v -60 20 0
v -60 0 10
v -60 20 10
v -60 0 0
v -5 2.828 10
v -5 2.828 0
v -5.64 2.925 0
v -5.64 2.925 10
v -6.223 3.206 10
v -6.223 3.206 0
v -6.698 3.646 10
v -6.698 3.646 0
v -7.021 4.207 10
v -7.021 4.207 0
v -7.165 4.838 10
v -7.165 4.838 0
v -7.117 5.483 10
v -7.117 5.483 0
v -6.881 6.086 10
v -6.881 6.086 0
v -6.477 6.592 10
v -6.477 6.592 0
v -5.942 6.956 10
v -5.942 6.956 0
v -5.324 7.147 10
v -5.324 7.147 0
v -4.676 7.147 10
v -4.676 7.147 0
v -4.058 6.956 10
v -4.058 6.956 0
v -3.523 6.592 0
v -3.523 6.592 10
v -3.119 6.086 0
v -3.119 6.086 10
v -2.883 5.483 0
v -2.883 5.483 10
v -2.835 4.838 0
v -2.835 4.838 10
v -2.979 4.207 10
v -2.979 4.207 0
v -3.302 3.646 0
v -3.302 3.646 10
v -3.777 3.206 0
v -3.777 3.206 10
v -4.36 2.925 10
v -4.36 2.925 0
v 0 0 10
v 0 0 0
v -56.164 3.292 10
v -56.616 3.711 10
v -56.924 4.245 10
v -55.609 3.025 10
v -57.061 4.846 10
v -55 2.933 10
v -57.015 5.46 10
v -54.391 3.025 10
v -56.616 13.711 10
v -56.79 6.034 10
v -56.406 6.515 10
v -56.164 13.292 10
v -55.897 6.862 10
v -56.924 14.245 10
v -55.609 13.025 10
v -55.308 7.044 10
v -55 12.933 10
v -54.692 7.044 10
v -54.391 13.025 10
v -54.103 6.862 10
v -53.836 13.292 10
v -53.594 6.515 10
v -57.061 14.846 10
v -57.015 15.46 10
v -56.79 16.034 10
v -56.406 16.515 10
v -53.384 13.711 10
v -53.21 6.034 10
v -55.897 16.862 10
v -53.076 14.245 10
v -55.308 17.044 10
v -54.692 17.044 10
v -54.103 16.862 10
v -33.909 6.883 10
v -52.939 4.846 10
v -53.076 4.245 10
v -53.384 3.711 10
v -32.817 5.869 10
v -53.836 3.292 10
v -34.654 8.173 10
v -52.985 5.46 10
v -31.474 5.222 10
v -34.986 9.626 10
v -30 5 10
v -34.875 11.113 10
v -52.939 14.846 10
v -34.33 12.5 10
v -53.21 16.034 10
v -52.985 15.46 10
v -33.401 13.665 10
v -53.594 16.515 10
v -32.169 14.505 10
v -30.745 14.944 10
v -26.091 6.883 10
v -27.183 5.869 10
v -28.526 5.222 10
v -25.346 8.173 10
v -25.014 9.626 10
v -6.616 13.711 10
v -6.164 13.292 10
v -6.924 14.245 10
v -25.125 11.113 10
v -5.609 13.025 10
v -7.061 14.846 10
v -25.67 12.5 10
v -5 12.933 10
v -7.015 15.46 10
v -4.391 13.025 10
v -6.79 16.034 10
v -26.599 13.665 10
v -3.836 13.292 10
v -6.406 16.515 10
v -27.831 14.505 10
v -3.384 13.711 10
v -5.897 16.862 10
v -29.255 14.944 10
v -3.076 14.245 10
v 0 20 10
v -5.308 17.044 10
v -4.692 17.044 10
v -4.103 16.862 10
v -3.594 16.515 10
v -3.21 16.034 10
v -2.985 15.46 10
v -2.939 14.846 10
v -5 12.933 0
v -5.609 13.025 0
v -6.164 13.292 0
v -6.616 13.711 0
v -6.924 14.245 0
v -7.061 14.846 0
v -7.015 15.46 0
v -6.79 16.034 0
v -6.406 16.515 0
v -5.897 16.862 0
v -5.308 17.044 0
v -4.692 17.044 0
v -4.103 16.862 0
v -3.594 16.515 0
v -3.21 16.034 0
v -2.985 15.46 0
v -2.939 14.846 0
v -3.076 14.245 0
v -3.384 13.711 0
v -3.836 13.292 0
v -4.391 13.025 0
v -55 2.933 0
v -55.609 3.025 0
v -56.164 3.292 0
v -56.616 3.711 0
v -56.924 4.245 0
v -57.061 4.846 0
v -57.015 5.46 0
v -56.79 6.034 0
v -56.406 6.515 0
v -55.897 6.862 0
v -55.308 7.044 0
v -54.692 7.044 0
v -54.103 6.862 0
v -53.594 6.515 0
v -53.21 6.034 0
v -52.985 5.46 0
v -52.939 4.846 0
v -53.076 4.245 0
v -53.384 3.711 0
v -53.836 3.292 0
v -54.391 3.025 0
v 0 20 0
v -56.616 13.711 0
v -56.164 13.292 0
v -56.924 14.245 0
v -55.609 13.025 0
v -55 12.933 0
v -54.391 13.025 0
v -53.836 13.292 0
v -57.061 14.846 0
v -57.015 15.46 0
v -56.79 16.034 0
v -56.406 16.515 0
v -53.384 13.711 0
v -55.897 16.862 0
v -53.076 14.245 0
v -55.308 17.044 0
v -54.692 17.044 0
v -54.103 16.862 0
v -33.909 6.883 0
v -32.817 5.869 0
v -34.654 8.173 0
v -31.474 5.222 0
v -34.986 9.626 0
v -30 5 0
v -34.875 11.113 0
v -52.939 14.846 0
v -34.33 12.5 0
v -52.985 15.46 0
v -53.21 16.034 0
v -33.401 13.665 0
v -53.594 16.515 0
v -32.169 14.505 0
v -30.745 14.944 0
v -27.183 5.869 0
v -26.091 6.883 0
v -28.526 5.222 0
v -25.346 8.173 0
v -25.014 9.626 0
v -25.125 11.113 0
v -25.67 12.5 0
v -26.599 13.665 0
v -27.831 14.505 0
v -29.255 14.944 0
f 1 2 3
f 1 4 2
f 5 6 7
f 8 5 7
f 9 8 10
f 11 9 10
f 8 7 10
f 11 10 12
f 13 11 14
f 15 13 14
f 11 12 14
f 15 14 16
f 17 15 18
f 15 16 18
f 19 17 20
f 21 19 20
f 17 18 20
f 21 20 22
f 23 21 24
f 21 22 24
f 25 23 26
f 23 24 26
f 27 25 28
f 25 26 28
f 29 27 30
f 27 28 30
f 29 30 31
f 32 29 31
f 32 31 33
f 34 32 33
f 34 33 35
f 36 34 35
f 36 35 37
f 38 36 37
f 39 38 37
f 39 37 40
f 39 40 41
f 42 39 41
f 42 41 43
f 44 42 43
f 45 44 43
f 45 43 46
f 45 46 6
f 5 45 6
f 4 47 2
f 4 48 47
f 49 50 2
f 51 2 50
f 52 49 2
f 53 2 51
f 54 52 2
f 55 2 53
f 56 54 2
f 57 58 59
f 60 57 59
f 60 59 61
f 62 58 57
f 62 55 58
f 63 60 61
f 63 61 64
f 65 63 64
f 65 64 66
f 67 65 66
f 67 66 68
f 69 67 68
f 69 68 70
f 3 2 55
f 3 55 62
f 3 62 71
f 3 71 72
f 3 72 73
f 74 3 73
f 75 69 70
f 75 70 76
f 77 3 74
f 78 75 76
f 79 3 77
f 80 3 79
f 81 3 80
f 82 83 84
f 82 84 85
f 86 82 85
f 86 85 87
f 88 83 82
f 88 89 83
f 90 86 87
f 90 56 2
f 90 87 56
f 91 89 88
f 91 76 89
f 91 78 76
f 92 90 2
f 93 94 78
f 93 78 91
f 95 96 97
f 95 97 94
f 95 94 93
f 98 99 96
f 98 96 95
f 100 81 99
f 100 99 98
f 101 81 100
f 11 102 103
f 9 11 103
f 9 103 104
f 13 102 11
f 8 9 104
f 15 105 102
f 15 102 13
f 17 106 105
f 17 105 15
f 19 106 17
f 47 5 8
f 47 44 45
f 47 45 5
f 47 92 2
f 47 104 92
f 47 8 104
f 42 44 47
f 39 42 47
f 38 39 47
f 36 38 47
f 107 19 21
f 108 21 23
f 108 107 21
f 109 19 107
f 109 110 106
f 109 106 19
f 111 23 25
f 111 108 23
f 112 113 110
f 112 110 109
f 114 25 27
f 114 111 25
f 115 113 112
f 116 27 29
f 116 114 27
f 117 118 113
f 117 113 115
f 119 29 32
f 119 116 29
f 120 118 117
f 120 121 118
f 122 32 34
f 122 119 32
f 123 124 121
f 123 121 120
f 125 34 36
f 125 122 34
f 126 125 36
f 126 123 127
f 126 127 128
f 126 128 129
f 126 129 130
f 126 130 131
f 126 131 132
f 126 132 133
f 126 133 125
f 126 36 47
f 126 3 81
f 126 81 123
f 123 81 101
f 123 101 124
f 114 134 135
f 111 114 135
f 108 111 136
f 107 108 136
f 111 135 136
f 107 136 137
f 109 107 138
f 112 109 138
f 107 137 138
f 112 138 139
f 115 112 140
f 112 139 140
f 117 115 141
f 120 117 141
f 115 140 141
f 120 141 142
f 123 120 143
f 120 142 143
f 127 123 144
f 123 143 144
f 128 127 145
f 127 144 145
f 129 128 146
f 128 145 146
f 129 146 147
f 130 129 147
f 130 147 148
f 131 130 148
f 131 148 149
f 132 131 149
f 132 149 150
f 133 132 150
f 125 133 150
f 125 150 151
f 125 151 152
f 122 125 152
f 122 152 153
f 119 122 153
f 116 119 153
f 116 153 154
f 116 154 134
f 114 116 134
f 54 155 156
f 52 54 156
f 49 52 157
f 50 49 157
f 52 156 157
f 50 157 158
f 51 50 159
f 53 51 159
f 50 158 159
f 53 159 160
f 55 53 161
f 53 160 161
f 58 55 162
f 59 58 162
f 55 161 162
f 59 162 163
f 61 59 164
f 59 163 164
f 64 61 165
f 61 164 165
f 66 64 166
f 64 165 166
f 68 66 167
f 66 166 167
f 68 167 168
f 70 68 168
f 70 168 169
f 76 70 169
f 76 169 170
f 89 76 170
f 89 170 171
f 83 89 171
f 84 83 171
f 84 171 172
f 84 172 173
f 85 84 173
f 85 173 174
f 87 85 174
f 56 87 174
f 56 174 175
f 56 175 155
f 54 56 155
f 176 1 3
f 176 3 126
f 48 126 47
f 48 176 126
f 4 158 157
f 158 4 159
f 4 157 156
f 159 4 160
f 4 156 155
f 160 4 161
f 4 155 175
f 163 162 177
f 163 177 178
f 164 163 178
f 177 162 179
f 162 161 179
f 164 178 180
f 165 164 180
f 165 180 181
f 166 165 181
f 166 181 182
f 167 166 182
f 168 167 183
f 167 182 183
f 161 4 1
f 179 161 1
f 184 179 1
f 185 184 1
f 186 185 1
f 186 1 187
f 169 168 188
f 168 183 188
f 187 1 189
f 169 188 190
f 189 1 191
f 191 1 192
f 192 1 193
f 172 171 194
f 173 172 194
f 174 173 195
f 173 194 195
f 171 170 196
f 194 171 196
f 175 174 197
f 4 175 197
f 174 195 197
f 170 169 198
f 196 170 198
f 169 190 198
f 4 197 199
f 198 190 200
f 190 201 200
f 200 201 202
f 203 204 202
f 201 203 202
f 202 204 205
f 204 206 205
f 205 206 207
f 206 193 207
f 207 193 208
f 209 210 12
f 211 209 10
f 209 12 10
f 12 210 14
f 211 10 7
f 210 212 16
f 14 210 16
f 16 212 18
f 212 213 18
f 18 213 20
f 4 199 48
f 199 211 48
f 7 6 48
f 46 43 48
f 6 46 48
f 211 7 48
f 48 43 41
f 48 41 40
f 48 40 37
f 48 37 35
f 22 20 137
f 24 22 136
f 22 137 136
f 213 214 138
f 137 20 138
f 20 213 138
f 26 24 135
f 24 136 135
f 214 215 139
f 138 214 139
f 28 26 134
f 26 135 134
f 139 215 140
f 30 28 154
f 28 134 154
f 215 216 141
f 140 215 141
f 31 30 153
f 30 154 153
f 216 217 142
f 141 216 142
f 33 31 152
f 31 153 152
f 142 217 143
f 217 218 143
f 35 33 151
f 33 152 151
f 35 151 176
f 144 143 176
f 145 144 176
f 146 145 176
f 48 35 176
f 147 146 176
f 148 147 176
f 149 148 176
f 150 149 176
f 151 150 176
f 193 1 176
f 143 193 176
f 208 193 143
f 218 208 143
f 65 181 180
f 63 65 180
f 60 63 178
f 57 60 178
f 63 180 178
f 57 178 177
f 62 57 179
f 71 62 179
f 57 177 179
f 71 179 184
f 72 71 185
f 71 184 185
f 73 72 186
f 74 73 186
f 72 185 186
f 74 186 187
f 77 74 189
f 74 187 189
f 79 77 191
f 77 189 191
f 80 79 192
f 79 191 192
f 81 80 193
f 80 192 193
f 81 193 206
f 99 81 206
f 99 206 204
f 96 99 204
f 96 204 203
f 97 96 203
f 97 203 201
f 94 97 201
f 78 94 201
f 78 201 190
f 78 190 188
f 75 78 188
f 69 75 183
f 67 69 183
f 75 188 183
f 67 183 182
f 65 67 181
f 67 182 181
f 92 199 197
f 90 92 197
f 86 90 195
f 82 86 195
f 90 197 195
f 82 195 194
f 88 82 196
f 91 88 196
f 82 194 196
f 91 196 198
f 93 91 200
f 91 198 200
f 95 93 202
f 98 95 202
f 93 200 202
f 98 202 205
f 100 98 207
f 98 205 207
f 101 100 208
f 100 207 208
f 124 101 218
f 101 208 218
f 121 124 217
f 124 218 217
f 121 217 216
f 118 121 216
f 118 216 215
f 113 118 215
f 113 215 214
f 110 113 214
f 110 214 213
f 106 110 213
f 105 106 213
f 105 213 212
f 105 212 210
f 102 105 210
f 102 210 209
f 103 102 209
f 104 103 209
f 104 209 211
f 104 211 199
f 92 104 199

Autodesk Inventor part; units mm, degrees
ref_plane "YZ Plane" through (0, 0, 0) normal (1, 0, 0) x (0, 1, 0)
ref_plane "XZ Plane" through (0, 0, 0) normal (0, 1, 0) x (-1, 0, 0)
ref_plane "XY Plane" through (0, 0, 0) normal (0, 0, 1) x (1, 0, 0)
sketch "Sketch4" plane through (0, 0, 0) normal (0, 0, 1) x (1, 0, 0)
  line L0 (0, 0) -> (-60, 0)
  line L1 (-60, 0) -> (-60, 20)
  line L2 (-60, 20) -> (0, 20)
  line L3 (0, 20) -> (0, 0)
  dimension "d37" = 60
  dimension "d38" = 20
extrude "Extrusion2" add sketch "Sketch4" along normal blind 10
hole "Hole2" at (-30, 10, 10) direction (0, 0, -1) diameter 10 depth 10 tip angle 118
hole "Hole3" at (-55, 15, 10) direction (0, 0, -1) diameter 4.134 depth 14.2 tip angle 118 thread size "M5x0.8" class "6H" standard "ISO Metric profile"
hole "Hole4" at (-5, 15, 10) direction (0, 0, -1) diameter 4.134 depth 14.2 tip angle 118 thread size "M5x0.8" class "6H" standard "ISO Metric profile"
hole "Hole5" at (-5, 5, 10) direction (0, 0, -1) diameter 4.343 depth 16.265 tip angle 118 thread size "12-24 UNC" class "2B" standard "ANSI Unified Screw Threads"
hole "Hole6" at (-55, 5, 10) direction (0, 0, -1) diameter 4.134 depth 14.2 tip angle 118 thread size "M5x0.8" class "6H" standard "ISO Metric profile"
properties part number "GARFO" material "Aluminium AW-7020"
